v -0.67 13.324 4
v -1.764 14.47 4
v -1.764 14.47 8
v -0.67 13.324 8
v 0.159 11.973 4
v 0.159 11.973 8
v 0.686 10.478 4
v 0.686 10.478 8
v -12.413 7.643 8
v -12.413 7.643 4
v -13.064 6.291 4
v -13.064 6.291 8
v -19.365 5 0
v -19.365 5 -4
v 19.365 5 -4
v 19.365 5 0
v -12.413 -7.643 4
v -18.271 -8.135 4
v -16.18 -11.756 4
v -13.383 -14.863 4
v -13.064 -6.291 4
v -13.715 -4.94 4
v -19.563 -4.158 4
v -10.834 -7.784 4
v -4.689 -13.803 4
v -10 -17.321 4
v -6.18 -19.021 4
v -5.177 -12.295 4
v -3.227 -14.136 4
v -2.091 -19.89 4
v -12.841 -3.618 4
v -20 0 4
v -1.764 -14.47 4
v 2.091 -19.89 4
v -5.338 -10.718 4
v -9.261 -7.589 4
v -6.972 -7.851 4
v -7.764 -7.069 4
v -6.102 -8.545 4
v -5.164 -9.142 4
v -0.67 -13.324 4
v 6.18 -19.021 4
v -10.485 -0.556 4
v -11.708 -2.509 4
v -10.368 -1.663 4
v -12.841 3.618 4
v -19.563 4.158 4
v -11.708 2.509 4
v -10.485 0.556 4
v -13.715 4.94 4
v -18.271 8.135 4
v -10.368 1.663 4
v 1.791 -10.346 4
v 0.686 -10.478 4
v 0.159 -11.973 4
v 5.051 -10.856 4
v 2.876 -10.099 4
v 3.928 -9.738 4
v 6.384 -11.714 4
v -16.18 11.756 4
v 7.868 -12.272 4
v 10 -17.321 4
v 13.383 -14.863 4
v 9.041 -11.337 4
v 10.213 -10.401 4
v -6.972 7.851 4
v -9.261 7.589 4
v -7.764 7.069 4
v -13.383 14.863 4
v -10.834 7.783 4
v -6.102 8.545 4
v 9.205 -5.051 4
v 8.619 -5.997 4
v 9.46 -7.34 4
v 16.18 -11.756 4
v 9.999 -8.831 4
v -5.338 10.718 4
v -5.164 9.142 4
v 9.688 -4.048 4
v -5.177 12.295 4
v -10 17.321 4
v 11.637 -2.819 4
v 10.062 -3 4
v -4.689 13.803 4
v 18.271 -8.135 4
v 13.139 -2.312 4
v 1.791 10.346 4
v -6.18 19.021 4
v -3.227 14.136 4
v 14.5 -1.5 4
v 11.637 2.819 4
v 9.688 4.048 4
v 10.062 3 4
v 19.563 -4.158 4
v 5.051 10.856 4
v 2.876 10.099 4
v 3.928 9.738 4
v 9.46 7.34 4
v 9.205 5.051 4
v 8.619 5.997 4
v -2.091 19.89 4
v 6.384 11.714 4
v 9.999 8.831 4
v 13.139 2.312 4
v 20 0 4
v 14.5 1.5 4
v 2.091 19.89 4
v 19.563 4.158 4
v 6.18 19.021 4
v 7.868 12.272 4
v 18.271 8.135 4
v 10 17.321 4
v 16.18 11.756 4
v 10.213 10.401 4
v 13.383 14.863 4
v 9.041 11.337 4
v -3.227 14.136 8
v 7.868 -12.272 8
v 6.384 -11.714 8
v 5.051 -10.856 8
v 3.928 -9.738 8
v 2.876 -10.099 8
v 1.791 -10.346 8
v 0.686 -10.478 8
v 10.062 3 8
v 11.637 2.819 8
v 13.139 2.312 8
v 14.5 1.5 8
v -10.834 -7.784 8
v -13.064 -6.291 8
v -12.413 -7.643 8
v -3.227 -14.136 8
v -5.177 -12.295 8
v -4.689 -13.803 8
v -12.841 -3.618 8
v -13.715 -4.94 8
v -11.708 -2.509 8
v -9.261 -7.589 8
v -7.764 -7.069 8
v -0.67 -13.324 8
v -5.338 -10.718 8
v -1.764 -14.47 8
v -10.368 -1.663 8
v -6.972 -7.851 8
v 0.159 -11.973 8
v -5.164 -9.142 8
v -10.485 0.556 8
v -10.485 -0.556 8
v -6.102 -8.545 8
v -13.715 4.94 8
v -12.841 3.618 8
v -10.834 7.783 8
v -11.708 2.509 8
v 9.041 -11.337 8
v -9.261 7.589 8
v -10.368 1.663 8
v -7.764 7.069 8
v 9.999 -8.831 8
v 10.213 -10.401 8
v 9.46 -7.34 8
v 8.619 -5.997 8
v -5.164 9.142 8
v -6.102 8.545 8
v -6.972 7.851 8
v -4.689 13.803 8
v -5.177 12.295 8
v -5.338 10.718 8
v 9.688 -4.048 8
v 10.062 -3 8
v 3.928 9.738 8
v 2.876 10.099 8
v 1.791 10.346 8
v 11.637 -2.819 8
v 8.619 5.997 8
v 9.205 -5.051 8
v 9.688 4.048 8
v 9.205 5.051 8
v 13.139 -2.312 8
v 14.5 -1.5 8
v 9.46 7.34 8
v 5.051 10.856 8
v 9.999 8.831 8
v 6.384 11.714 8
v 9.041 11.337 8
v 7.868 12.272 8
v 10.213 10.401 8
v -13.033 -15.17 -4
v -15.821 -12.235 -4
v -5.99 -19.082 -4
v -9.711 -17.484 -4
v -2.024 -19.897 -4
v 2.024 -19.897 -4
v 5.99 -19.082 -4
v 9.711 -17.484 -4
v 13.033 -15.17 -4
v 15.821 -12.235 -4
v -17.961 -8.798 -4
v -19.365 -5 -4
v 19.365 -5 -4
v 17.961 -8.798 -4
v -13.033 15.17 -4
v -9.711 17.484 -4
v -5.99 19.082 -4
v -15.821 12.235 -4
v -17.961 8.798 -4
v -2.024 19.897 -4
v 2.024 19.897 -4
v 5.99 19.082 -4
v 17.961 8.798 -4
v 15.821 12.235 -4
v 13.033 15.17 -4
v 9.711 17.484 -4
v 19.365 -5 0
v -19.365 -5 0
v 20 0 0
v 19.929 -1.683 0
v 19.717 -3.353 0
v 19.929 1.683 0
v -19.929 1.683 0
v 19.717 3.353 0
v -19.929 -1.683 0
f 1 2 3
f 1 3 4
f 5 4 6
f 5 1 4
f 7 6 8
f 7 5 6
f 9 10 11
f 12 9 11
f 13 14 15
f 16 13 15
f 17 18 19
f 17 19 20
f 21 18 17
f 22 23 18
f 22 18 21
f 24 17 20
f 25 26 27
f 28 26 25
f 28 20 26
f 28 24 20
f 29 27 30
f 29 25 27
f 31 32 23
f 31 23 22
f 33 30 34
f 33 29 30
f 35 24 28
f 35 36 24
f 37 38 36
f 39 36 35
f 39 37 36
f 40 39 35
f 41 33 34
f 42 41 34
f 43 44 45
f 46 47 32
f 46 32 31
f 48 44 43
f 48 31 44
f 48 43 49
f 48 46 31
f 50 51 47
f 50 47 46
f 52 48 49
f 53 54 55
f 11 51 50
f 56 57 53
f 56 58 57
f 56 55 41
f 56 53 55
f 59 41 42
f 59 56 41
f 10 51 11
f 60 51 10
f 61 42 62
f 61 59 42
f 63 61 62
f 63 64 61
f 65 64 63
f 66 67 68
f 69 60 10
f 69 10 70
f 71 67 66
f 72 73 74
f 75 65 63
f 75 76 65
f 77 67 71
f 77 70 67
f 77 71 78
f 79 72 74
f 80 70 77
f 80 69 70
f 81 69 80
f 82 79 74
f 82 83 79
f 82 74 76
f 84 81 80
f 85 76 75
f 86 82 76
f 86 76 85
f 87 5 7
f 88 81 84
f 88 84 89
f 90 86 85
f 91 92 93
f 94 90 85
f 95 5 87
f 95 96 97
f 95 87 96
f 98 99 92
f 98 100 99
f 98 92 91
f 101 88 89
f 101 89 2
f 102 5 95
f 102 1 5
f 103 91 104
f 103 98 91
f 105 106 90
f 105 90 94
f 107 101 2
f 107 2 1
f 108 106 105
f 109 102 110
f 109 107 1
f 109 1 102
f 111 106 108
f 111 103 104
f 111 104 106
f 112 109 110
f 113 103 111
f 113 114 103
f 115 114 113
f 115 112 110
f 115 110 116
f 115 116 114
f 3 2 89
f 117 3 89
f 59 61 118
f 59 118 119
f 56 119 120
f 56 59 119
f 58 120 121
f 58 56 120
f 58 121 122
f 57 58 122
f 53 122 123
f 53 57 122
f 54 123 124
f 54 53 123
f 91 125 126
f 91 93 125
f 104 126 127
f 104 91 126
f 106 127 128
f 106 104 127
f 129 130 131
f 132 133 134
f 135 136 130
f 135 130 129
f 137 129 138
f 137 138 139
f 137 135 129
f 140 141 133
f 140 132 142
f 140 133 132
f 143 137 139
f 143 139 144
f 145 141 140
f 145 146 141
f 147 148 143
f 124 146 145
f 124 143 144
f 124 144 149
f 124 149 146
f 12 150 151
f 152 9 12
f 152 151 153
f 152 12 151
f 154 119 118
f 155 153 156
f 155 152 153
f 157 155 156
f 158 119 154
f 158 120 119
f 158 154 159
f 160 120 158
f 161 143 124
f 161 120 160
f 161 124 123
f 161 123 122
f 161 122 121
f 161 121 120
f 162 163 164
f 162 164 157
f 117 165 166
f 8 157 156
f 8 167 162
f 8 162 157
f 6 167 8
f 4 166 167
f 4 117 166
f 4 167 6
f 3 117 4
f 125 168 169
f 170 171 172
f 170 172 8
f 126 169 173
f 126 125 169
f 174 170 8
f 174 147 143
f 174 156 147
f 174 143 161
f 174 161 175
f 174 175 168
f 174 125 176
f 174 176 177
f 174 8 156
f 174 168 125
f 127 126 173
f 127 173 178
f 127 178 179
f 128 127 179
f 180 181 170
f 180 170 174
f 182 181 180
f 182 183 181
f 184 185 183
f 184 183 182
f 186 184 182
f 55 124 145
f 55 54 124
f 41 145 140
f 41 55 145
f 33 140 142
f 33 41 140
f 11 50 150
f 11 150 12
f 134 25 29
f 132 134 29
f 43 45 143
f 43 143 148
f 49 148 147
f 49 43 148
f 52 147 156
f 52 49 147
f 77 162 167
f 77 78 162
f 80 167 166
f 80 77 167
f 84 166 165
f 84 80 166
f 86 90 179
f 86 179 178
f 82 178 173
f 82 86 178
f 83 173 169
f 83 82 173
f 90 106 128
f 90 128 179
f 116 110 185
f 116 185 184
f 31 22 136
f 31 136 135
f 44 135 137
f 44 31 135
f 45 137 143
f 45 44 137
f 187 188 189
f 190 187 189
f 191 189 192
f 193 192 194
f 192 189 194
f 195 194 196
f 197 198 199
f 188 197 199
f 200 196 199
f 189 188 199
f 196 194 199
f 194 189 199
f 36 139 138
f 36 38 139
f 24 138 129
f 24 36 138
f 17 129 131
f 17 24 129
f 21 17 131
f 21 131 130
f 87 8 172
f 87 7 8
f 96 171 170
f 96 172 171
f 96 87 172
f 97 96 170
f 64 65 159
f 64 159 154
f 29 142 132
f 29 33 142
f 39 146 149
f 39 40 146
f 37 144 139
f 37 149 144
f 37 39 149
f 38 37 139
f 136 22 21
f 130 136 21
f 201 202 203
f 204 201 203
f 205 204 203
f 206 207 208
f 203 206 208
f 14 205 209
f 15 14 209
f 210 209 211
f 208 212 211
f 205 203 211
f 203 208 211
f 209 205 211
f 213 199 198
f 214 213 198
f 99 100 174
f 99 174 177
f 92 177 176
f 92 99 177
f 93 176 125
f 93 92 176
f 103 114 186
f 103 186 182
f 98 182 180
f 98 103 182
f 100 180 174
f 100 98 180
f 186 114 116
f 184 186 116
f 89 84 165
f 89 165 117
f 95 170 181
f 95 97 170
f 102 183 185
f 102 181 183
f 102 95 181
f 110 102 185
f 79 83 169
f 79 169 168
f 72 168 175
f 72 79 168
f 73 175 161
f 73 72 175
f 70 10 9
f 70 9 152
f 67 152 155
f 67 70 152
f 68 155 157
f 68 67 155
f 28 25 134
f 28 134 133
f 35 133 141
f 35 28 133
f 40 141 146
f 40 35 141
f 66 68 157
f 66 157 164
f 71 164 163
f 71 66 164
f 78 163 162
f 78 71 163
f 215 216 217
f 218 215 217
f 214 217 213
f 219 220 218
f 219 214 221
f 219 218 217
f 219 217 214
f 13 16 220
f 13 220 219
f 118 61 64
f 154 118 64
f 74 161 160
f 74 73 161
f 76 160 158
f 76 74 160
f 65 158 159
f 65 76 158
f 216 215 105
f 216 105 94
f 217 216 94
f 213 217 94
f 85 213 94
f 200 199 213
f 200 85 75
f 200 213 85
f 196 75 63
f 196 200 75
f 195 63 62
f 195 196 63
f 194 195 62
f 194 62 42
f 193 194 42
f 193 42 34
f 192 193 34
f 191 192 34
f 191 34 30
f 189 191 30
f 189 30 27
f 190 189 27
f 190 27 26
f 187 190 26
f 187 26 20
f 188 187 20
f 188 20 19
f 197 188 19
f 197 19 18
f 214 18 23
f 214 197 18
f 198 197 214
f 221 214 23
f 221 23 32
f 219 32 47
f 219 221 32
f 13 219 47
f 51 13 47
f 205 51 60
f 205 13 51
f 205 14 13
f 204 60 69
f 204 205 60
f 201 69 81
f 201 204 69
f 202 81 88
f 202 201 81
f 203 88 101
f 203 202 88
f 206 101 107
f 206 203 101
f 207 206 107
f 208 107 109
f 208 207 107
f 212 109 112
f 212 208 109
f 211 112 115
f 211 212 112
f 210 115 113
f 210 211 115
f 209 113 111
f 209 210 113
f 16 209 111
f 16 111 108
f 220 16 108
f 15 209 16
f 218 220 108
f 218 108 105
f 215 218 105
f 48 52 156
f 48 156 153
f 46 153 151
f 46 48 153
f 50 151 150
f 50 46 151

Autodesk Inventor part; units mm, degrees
ref_plane "YZ Plane" through (0, 0, 0) normal (1, 0, 0) x (0, 1, 0)
ref_plane "XZ Plane" through (0, 0, 0) normal (0, 1, 0) x (-1, 0, 0)
ref_plane "XY Plane" through (0, 0, 0) normal (0, 0, 1) x (1, 0, 0)
sketch "Sketch1" plane through (0, 0, 0) normal (0, 0, 1) x (1, 0, 0)
  circle A0 centre (0, 0) radius 20
  dimension "d0" = 40
extrude "Extrusion1" add sketch "Sketch1" along normal mid plane 8
sketch "Sketch2" plane through (0, 0, -4) normal (0, 0, -1) x (-1, 0, 0)
  line L0 (-20, 0) -> (20, 0) construction
  line L1 (-20, -5) -> (20, -5)
  line L2 (20, 5) -> (-20, 5)
  arc A0 (-20, 5) -> (-20, -5) centre (-20, 0) ccw
  arc A1 (20, -5) -> (20, 5) centre (20, 0) ccw
  line L3 (0, 0) -> (40, 0) construction
  dimension "d3" = 20
  dimension "d4" = 0
  dimension "d5" = 10
extrude "Extrusion2" cut sketch "Sketch2" against normal blind 4
sketch "Sketch6" plane through (0, 0, 4) normal (0, 0, 1) x (1, 0, 0)
  line L0 (-28, 0) -> (28, 0) projected
  arc A0 (14.5, 1.5) -> (10.0623, 3) centre (9.9997, -4.4997) ccw
  line L1 (14.5, 1.5) -> (14.5, 0)
  arc A1 (10.0623, -3) -> (14.5, -1.5) centre (9.9997, 4.4997) ccw
  line L2 (14.5, -1.5) -> (14.5, 0)
  arc A2 (7.8679, 12.2718) -> (3.9283, 9.7375) centre (9.7527, 5.0125) ccw
  line L3 (7.8679, 12.2718) -> (9.0406, 11.3366)
  line L4 (10.2133, 10.4013) -> (9.0406, 11.3366)
  arc A3 (8.6192, 5.9966) -> (10.2133, 10.4013) centre (2.7166, 10.6236) ccw
  arc A4 (-4.6889, 13.8027) -> (-5.1639, 9.1425) centre (2.1618, 10.7502) ccw
  line L5 (-4.6889, 13.8027) -> (-3.2266, 14.1365)
  line L6 (-1.7642, 14.4702) -> (-3.2266, 14.1365)
  arc A5 (0.6857, 10.4776) -> (-1.7642, 14.4702) centre (-6.6121, 8.7477) ccw
  arc A6 (-13.7149, 4.9399) -> (-10.3675, 1.663) centre (-7.057, 8.3928) ccw
  line L7 (-13.7149, 4.9399) -> (-13.064, 6.2913)
  line L8 (-12.4132, 7.6428) -> (-13.064, 6.2913)
  arc A7 (-7.7642, 7.0688) -> (-12.4132, 7.6428) centre (-10.9617, 0.2846) ccw
  arc A8 (-12.4132, -7.6428) -> (-7.7642, -7.0688) centre (-10.9617, -0.2846) ccw
  line L9 (-12.4132, -7.6428) -> (-13.064, -6.2913)
  line L10 (-13.7149, -4.9399) -> (-13.064, -6.2913)
  arc A9 (-10.3675, -1.663) -> (-13.7149, -4.9399) centre (-7.057, -8.3928) ccw
  arc A10 (-1.7642, -14.4702) -> (0.6857, -10.4776) centre (-6.6121, -8.7477) ccw
  line L11 (-1.7642, -14.4702) -> (-3.2266, -14.1365)
  line L12 (-4.6889, -13.8027) -> (-3.2266, -14.1365)
  arc A11 (-5.1639, -9.1425) -> (-4.6889, -13.8027) centre (2.1618, -10.7502) ccw
  arc A12 (10.2133, -10.4013) -> (8.6192, -5.9966) centre (2.7166, -10.6236) ccw
  line L13 (10.2133, -10.4013) -> (9.0406, -11.3366)
  line L14 (7.8679, -12.2718) -> (9.0406, -11.3366)
  arc A13 (3.9283, -9.7375) -> (7.8679, -12.2718) centre (9.7527, -5.0125) ccw
  arc A14 (10.0623, 3) -> (8.6192, 5.9966) centre (0, 0) ccw
  arc A15 (3.9283, 9.7375) -> (0.6857, 10.4776) centre (0, 0) ccw
  arc A16 (-5.1639, 9.1425) -> (-7.7642, 7.0688) centre (0, 0) ccw
  arc A17 (-10.3675, 1.663) -> (-10.3675, -1.663) centre (0, 0) ccw
  arc A18 (-7.7642, -7.0688) -> (-5.1639, -9.1425) centre (0, 0) ccw
  arc A19 (0.6857, -10.4776) -> (3.9283, -9.7375) centre (0, 0) ccw
  arc A20 (8.6192, -5.9966) -> (10.0623, -3) centre (0, 0) ccw
  dimension "d33" = 1.5
  dimension "d34" = 3
  dimension "d35" = 7.5
  dimension "d36" = 14.5
  dimension "d39" = 360
extrude "Extrusion4" add sketch "Sketch6" along normal blind 4
properties part number "3d-tandwiel"
